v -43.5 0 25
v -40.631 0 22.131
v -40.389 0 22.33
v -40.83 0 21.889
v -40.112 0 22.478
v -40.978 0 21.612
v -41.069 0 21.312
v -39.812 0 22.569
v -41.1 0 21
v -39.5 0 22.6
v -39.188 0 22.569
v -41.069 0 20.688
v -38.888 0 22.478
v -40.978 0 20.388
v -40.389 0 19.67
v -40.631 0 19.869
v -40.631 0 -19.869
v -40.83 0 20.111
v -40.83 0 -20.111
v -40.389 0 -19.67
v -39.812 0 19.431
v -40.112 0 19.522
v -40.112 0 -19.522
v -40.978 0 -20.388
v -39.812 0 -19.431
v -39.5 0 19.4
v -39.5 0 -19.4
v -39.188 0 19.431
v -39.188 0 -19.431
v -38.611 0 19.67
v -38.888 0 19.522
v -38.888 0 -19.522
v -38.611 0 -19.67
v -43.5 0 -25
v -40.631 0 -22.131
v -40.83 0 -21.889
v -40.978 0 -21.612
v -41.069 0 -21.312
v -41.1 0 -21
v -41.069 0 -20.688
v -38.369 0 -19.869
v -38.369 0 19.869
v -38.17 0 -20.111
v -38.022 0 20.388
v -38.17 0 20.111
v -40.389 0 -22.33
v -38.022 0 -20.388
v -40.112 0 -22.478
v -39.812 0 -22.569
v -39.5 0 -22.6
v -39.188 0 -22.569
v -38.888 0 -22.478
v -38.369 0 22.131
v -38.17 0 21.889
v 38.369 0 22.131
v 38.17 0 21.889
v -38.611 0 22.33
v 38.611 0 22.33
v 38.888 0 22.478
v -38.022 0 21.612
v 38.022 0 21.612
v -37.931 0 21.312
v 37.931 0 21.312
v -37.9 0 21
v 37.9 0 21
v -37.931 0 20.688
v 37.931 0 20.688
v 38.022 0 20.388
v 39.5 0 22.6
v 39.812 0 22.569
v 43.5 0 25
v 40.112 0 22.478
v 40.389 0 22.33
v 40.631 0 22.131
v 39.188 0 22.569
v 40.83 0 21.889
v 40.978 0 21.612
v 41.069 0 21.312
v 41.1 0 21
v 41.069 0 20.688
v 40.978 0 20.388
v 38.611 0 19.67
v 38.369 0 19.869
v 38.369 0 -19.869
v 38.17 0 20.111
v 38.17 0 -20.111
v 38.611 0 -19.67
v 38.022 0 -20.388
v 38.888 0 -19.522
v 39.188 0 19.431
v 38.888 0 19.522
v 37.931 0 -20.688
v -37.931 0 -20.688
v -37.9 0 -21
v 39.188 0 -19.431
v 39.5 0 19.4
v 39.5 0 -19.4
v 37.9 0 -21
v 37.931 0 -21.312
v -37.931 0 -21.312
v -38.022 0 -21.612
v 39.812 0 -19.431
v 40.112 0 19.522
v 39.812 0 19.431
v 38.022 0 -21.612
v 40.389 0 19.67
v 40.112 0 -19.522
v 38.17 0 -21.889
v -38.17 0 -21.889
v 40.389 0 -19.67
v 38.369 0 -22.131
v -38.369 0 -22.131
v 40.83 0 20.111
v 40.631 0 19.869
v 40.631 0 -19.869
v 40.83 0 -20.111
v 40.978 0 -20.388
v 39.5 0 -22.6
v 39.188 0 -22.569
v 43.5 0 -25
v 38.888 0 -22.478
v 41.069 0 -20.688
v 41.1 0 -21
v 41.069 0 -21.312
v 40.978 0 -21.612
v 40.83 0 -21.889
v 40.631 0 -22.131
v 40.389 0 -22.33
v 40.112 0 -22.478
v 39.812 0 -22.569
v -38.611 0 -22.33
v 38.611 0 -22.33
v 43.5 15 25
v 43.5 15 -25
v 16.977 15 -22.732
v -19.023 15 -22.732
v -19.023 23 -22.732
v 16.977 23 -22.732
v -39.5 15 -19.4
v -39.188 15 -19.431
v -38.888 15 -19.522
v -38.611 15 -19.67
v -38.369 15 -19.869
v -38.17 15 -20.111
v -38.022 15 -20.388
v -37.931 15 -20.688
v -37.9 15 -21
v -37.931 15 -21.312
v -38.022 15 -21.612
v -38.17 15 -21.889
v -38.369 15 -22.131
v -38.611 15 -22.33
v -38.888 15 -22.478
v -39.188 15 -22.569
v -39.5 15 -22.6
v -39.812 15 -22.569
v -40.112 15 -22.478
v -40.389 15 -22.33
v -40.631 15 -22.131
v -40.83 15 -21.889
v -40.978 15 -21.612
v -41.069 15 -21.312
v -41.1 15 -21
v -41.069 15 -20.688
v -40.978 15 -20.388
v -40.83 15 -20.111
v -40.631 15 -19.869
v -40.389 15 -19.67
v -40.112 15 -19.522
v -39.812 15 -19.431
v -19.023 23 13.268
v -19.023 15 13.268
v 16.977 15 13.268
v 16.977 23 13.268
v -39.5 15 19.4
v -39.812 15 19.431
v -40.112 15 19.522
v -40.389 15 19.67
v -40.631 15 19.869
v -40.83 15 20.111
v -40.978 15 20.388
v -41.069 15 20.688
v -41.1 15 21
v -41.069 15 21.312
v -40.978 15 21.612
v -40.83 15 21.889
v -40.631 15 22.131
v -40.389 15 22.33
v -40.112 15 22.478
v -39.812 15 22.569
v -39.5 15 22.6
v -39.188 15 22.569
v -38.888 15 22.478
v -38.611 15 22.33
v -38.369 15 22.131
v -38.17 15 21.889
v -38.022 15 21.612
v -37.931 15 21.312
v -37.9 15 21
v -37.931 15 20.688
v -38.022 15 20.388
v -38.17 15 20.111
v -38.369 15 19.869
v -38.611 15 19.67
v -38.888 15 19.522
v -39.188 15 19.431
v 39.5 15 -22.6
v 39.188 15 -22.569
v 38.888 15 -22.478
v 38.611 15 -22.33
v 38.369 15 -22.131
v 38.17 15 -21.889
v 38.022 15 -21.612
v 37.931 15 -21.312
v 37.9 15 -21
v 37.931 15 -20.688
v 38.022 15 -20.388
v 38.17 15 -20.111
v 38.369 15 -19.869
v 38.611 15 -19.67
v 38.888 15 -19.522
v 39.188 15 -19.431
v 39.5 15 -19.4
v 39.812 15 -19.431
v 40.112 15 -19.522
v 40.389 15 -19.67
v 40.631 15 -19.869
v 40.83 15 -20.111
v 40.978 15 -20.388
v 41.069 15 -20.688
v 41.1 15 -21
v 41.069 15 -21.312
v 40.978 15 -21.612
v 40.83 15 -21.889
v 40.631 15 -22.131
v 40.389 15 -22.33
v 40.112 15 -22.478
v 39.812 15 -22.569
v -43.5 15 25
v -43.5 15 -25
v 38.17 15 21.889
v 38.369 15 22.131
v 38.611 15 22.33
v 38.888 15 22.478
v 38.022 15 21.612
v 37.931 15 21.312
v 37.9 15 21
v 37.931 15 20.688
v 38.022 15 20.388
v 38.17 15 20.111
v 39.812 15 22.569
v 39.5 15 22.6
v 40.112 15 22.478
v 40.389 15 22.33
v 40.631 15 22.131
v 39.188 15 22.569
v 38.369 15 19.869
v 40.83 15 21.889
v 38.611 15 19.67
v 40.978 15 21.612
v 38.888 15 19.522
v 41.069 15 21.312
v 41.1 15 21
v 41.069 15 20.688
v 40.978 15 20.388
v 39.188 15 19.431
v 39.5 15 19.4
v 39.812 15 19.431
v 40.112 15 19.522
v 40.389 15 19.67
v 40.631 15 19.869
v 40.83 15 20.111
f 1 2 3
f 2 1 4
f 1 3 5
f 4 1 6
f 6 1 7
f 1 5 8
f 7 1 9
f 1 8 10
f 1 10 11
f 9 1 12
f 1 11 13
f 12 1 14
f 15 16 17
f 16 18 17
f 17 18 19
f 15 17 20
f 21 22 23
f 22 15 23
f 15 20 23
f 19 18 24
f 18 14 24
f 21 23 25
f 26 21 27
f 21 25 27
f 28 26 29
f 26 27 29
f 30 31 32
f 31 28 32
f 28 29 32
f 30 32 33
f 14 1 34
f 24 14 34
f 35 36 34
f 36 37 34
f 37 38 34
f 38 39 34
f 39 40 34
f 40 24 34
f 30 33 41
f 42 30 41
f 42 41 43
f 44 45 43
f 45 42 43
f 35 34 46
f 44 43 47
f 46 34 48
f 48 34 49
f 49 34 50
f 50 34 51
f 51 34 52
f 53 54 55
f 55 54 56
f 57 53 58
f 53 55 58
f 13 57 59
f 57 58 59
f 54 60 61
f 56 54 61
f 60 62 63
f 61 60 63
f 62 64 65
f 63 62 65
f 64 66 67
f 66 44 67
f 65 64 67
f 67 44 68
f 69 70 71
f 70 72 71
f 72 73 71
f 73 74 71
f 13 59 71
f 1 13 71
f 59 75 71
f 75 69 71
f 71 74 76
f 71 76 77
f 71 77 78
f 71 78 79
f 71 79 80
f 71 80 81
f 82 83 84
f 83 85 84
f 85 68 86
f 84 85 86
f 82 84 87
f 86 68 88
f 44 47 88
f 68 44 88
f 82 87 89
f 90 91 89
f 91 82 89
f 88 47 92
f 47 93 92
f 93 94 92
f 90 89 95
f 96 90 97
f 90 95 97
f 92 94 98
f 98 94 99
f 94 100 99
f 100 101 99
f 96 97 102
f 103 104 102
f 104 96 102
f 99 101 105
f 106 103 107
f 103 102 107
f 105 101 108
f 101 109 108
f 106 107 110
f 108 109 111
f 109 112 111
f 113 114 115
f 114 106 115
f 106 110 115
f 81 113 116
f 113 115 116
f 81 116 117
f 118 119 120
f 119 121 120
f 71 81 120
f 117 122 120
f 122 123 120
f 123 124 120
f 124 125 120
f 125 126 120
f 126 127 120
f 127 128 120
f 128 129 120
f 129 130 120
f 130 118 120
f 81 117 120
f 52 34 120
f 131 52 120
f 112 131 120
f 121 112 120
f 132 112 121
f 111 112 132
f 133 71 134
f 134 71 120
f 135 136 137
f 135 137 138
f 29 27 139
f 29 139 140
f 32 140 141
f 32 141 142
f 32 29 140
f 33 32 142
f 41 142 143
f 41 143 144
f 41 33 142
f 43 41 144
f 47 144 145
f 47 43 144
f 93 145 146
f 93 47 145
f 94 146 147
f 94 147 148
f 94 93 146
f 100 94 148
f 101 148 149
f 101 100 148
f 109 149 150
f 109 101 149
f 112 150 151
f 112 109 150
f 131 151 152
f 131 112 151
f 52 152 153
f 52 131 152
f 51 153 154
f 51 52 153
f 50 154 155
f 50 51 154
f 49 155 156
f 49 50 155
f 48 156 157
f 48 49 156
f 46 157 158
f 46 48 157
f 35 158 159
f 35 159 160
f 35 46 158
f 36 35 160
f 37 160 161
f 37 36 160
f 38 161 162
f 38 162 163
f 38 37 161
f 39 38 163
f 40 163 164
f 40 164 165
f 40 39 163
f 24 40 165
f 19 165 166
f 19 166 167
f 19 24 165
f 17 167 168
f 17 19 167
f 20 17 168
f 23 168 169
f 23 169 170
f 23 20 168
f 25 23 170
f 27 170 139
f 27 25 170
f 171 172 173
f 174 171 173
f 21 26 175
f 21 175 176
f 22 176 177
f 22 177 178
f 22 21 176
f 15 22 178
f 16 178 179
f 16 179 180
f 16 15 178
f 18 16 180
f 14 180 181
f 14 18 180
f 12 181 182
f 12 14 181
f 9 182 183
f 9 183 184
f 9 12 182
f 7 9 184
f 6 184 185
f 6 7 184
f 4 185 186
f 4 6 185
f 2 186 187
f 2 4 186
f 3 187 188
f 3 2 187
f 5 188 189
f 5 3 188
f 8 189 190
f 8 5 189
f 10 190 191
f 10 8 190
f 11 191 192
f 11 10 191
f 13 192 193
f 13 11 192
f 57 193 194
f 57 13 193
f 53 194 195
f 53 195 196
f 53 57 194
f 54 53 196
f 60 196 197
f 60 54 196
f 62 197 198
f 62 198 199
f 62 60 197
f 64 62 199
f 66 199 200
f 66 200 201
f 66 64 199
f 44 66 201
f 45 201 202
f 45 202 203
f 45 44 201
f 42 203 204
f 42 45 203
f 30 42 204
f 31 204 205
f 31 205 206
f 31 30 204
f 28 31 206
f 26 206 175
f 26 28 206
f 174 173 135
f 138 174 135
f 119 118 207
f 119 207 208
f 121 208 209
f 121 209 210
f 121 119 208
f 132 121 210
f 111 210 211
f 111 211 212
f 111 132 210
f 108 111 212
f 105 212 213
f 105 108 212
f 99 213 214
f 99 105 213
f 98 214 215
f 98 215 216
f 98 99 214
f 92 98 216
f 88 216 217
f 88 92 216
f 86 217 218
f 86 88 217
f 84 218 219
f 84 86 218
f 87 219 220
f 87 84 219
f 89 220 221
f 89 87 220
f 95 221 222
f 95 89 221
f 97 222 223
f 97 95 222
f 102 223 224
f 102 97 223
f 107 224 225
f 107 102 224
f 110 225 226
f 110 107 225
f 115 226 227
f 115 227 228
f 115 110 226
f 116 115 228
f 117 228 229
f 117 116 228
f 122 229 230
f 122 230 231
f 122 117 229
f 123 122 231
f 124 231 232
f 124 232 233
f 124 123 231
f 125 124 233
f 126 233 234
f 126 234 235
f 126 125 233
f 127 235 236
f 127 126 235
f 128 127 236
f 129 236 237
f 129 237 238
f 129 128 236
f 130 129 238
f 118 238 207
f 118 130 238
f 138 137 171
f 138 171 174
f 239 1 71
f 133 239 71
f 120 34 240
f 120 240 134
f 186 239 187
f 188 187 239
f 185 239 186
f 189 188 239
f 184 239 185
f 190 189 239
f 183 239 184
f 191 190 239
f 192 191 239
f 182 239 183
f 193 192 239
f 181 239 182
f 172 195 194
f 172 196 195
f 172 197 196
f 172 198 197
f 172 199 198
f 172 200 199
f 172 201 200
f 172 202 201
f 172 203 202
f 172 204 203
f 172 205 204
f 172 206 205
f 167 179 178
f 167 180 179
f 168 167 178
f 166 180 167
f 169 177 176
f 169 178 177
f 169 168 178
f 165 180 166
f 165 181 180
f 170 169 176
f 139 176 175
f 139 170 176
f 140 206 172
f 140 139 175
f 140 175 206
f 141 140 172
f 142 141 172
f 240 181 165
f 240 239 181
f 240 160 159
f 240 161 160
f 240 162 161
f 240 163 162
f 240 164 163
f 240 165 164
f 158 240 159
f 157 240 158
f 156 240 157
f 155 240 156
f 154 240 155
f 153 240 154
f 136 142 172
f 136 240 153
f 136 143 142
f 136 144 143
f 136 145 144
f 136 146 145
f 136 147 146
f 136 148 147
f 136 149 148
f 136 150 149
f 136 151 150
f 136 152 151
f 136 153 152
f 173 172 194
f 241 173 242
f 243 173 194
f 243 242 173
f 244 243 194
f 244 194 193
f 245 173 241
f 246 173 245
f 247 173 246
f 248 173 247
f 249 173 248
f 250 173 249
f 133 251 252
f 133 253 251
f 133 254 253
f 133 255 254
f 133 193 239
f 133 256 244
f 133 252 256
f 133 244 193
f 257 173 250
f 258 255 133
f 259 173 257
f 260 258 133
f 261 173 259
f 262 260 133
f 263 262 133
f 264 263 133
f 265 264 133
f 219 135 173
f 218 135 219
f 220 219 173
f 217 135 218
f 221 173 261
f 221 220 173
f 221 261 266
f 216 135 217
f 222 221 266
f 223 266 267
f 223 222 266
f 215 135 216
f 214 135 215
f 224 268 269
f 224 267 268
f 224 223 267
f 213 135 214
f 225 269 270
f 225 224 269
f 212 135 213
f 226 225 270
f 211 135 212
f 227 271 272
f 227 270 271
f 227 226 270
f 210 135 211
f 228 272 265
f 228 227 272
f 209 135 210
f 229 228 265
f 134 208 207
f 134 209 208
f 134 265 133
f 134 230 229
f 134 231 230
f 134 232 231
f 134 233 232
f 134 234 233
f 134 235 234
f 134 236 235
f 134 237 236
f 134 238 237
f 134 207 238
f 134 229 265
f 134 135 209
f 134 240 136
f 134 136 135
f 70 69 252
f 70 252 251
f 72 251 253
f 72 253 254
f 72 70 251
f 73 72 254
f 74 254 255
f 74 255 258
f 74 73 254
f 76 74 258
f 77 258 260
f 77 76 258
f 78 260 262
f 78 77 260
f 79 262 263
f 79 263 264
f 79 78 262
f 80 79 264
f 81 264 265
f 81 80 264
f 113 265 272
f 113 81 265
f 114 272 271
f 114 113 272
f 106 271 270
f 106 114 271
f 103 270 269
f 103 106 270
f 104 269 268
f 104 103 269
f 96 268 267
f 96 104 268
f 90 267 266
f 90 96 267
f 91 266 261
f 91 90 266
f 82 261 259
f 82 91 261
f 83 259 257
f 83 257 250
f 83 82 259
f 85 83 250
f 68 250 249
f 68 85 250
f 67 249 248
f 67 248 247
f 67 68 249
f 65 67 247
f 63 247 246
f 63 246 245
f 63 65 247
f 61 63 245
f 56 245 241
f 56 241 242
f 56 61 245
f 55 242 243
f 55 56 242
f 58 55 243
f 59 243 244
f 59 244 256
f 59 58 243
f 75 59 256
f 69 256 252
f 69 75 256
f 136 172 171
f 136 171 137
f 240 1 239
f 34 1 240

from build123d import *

# Parameters (mm, degrees)
SKETCH_1_W      = 87
SKETCH_1_H      = 50
SKETCH_1_R      = 1.6
EXTRUDE_1_DEPTH = 15
SKETCH_2_W      = 36
SKETCH_2_H      = 36
EXTRUDE_2_DEPTH = 8


with BuildPart() as part:
    # 草图1 → 凸台-拉伸1 (new body)
    with BuildSketch(Plane(origin=(0, 0, 0), x_dir=(1, 0, 0), z_dir=(0, 1, 0))):
        Rectangle(SKETCH_1_W, SKETCH_1_H)
        with Locations(Location((-39.5, 21, 0), (0, 0, 270))):
            Circle(SKETCH_1_R, mode=Mode.SUBTRACT)
        with Locations(Location((39.5, 21, 0), (0, 0, 90))):
            Circle(SKETCH_1_R, mode=Mode.SUBTRACT)
        with Locations(Location((39.5, -21, 0), (0, 0, 270))):
            Circle(SKETCH_1_R, mode=Mode.SUBTRACT)
        with Locations(Location((-39.5, -21, 0), (0, 0, 90))):
            Circle(SKETCH_1_R, mode=Mode.SUBTRACT)
    extrude(amount=EXTRUDE_1_DEPTH)

    # 草图2 → 凸台-拉伸2 (add)
    with BuildSketch(Plane(origin=(0, 15, 0), x_dir=(1, 0, 0), z_dir=(0, 1, 0))):
        with Locations((-1.022681739, 4.732356083)):
            Rectangle(SKETCH_2_W, SKETCH_2_H)
    extrude(amount=EXTRUDE_2_DEPTH)


solid = part.part
